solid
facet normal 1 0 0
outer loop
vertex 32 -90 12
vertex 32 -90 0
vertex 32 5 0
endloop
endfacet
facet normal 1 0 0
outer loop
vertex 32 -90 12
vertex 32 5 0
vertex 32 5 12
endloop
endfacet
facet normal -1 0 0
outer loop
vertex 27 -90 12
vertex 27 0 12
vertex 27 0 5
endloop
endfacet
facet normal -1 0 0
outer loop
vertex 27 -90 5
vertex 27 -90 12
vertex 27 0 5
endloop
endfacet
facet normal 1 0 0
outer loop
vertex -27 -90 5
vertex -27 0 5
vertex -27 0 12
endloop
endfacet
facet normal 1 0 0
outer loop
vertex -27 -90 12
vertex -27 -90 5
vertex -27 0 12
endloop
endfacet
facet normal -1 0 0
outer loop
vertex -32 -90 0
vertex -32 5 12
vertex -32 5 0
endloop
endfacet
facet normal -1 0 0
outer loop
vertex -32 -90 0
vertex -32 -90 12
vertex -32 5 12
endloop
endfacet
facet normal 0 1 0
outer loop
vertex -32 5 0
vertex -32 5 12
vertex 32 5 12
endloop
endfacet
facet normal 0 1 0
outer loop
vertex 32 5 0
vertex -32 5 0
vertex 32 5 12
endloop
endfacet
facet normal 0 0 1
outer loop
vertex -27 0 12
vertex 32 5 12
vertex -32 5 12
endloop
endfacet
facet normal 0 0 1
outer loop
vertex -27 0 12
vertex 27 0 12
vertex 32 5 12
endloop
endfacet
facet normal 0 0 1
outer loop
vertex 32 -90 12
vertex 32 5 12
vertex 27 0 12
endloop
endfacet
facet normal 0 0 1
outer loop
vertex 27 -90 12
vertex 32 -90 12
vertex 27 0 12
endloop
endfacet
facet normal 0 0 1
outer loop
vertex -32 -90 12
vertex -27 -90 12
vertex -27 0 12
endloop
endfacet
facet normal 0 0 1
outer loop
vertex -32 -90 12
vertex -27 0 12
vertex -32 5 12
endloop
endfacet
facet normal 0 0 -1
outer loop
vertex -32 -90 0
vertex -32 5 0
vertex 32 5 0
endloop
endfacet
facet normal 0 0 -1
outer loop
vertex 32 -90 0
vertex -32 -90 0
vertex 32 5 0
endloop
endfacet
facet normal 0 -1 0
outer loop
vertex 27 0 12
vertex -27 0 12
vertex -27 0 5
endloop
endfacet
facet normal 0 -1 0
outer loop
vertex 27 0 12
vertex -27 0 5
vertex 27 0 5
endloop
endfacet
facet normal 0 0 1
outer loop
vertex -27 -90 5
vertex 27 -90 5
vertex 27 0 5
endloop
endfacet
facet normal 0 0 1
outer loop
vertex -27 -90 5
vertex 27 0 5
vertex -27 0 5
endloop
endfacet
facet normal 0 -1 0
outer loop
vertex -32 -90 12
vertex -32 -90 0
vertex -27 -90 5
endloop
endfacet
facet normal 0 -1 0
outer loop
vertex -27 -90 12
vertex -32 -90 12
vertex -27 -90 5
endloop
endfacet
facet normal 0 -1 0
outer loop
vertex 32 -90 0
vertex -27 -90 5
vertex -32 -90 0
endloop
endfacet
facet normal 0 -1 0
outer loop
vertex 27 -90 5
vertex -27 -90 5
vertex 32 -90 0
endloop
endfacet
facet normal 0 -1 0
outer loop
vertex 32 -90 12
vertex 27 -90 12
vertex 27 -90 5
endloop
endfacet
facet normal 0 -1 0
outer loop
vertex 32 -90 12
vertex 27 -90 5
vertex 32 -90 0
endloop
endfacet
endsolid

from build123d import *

# Parameters (mm, degrees)
F1_DEPTH = 90
F2_DEPTH = 5


with BuildPart() as f1:
    # F0 (on Front) → F1 (new body)
    with BuildSketch(Plane.XZ):
        Polygon((-27, 12), (-32, 12), (-32, 0), (0, 0), (32, 0), (32, 12), (27, 12), (27, 5), (0, 5), (-27, 5), align=None)
    extrude(amount=F1_DEPTH)

    # F0 (on Front) → F2 (join)
    with BuildSketch(Plane.XZ):
        Polygon((-27, 12), (-32, 12), (-32, 0), (0, 0), (32, 0), (32, 12), (27, 12), (27, 5), (0, 5), (-27, 5), align=None)
        Polygon((27, 12), (-27, 12), (-27, 5), (0, 5), (27, 5), align=None)
    extrude(amount=-F2_DEPTH)


solid = f1.part
